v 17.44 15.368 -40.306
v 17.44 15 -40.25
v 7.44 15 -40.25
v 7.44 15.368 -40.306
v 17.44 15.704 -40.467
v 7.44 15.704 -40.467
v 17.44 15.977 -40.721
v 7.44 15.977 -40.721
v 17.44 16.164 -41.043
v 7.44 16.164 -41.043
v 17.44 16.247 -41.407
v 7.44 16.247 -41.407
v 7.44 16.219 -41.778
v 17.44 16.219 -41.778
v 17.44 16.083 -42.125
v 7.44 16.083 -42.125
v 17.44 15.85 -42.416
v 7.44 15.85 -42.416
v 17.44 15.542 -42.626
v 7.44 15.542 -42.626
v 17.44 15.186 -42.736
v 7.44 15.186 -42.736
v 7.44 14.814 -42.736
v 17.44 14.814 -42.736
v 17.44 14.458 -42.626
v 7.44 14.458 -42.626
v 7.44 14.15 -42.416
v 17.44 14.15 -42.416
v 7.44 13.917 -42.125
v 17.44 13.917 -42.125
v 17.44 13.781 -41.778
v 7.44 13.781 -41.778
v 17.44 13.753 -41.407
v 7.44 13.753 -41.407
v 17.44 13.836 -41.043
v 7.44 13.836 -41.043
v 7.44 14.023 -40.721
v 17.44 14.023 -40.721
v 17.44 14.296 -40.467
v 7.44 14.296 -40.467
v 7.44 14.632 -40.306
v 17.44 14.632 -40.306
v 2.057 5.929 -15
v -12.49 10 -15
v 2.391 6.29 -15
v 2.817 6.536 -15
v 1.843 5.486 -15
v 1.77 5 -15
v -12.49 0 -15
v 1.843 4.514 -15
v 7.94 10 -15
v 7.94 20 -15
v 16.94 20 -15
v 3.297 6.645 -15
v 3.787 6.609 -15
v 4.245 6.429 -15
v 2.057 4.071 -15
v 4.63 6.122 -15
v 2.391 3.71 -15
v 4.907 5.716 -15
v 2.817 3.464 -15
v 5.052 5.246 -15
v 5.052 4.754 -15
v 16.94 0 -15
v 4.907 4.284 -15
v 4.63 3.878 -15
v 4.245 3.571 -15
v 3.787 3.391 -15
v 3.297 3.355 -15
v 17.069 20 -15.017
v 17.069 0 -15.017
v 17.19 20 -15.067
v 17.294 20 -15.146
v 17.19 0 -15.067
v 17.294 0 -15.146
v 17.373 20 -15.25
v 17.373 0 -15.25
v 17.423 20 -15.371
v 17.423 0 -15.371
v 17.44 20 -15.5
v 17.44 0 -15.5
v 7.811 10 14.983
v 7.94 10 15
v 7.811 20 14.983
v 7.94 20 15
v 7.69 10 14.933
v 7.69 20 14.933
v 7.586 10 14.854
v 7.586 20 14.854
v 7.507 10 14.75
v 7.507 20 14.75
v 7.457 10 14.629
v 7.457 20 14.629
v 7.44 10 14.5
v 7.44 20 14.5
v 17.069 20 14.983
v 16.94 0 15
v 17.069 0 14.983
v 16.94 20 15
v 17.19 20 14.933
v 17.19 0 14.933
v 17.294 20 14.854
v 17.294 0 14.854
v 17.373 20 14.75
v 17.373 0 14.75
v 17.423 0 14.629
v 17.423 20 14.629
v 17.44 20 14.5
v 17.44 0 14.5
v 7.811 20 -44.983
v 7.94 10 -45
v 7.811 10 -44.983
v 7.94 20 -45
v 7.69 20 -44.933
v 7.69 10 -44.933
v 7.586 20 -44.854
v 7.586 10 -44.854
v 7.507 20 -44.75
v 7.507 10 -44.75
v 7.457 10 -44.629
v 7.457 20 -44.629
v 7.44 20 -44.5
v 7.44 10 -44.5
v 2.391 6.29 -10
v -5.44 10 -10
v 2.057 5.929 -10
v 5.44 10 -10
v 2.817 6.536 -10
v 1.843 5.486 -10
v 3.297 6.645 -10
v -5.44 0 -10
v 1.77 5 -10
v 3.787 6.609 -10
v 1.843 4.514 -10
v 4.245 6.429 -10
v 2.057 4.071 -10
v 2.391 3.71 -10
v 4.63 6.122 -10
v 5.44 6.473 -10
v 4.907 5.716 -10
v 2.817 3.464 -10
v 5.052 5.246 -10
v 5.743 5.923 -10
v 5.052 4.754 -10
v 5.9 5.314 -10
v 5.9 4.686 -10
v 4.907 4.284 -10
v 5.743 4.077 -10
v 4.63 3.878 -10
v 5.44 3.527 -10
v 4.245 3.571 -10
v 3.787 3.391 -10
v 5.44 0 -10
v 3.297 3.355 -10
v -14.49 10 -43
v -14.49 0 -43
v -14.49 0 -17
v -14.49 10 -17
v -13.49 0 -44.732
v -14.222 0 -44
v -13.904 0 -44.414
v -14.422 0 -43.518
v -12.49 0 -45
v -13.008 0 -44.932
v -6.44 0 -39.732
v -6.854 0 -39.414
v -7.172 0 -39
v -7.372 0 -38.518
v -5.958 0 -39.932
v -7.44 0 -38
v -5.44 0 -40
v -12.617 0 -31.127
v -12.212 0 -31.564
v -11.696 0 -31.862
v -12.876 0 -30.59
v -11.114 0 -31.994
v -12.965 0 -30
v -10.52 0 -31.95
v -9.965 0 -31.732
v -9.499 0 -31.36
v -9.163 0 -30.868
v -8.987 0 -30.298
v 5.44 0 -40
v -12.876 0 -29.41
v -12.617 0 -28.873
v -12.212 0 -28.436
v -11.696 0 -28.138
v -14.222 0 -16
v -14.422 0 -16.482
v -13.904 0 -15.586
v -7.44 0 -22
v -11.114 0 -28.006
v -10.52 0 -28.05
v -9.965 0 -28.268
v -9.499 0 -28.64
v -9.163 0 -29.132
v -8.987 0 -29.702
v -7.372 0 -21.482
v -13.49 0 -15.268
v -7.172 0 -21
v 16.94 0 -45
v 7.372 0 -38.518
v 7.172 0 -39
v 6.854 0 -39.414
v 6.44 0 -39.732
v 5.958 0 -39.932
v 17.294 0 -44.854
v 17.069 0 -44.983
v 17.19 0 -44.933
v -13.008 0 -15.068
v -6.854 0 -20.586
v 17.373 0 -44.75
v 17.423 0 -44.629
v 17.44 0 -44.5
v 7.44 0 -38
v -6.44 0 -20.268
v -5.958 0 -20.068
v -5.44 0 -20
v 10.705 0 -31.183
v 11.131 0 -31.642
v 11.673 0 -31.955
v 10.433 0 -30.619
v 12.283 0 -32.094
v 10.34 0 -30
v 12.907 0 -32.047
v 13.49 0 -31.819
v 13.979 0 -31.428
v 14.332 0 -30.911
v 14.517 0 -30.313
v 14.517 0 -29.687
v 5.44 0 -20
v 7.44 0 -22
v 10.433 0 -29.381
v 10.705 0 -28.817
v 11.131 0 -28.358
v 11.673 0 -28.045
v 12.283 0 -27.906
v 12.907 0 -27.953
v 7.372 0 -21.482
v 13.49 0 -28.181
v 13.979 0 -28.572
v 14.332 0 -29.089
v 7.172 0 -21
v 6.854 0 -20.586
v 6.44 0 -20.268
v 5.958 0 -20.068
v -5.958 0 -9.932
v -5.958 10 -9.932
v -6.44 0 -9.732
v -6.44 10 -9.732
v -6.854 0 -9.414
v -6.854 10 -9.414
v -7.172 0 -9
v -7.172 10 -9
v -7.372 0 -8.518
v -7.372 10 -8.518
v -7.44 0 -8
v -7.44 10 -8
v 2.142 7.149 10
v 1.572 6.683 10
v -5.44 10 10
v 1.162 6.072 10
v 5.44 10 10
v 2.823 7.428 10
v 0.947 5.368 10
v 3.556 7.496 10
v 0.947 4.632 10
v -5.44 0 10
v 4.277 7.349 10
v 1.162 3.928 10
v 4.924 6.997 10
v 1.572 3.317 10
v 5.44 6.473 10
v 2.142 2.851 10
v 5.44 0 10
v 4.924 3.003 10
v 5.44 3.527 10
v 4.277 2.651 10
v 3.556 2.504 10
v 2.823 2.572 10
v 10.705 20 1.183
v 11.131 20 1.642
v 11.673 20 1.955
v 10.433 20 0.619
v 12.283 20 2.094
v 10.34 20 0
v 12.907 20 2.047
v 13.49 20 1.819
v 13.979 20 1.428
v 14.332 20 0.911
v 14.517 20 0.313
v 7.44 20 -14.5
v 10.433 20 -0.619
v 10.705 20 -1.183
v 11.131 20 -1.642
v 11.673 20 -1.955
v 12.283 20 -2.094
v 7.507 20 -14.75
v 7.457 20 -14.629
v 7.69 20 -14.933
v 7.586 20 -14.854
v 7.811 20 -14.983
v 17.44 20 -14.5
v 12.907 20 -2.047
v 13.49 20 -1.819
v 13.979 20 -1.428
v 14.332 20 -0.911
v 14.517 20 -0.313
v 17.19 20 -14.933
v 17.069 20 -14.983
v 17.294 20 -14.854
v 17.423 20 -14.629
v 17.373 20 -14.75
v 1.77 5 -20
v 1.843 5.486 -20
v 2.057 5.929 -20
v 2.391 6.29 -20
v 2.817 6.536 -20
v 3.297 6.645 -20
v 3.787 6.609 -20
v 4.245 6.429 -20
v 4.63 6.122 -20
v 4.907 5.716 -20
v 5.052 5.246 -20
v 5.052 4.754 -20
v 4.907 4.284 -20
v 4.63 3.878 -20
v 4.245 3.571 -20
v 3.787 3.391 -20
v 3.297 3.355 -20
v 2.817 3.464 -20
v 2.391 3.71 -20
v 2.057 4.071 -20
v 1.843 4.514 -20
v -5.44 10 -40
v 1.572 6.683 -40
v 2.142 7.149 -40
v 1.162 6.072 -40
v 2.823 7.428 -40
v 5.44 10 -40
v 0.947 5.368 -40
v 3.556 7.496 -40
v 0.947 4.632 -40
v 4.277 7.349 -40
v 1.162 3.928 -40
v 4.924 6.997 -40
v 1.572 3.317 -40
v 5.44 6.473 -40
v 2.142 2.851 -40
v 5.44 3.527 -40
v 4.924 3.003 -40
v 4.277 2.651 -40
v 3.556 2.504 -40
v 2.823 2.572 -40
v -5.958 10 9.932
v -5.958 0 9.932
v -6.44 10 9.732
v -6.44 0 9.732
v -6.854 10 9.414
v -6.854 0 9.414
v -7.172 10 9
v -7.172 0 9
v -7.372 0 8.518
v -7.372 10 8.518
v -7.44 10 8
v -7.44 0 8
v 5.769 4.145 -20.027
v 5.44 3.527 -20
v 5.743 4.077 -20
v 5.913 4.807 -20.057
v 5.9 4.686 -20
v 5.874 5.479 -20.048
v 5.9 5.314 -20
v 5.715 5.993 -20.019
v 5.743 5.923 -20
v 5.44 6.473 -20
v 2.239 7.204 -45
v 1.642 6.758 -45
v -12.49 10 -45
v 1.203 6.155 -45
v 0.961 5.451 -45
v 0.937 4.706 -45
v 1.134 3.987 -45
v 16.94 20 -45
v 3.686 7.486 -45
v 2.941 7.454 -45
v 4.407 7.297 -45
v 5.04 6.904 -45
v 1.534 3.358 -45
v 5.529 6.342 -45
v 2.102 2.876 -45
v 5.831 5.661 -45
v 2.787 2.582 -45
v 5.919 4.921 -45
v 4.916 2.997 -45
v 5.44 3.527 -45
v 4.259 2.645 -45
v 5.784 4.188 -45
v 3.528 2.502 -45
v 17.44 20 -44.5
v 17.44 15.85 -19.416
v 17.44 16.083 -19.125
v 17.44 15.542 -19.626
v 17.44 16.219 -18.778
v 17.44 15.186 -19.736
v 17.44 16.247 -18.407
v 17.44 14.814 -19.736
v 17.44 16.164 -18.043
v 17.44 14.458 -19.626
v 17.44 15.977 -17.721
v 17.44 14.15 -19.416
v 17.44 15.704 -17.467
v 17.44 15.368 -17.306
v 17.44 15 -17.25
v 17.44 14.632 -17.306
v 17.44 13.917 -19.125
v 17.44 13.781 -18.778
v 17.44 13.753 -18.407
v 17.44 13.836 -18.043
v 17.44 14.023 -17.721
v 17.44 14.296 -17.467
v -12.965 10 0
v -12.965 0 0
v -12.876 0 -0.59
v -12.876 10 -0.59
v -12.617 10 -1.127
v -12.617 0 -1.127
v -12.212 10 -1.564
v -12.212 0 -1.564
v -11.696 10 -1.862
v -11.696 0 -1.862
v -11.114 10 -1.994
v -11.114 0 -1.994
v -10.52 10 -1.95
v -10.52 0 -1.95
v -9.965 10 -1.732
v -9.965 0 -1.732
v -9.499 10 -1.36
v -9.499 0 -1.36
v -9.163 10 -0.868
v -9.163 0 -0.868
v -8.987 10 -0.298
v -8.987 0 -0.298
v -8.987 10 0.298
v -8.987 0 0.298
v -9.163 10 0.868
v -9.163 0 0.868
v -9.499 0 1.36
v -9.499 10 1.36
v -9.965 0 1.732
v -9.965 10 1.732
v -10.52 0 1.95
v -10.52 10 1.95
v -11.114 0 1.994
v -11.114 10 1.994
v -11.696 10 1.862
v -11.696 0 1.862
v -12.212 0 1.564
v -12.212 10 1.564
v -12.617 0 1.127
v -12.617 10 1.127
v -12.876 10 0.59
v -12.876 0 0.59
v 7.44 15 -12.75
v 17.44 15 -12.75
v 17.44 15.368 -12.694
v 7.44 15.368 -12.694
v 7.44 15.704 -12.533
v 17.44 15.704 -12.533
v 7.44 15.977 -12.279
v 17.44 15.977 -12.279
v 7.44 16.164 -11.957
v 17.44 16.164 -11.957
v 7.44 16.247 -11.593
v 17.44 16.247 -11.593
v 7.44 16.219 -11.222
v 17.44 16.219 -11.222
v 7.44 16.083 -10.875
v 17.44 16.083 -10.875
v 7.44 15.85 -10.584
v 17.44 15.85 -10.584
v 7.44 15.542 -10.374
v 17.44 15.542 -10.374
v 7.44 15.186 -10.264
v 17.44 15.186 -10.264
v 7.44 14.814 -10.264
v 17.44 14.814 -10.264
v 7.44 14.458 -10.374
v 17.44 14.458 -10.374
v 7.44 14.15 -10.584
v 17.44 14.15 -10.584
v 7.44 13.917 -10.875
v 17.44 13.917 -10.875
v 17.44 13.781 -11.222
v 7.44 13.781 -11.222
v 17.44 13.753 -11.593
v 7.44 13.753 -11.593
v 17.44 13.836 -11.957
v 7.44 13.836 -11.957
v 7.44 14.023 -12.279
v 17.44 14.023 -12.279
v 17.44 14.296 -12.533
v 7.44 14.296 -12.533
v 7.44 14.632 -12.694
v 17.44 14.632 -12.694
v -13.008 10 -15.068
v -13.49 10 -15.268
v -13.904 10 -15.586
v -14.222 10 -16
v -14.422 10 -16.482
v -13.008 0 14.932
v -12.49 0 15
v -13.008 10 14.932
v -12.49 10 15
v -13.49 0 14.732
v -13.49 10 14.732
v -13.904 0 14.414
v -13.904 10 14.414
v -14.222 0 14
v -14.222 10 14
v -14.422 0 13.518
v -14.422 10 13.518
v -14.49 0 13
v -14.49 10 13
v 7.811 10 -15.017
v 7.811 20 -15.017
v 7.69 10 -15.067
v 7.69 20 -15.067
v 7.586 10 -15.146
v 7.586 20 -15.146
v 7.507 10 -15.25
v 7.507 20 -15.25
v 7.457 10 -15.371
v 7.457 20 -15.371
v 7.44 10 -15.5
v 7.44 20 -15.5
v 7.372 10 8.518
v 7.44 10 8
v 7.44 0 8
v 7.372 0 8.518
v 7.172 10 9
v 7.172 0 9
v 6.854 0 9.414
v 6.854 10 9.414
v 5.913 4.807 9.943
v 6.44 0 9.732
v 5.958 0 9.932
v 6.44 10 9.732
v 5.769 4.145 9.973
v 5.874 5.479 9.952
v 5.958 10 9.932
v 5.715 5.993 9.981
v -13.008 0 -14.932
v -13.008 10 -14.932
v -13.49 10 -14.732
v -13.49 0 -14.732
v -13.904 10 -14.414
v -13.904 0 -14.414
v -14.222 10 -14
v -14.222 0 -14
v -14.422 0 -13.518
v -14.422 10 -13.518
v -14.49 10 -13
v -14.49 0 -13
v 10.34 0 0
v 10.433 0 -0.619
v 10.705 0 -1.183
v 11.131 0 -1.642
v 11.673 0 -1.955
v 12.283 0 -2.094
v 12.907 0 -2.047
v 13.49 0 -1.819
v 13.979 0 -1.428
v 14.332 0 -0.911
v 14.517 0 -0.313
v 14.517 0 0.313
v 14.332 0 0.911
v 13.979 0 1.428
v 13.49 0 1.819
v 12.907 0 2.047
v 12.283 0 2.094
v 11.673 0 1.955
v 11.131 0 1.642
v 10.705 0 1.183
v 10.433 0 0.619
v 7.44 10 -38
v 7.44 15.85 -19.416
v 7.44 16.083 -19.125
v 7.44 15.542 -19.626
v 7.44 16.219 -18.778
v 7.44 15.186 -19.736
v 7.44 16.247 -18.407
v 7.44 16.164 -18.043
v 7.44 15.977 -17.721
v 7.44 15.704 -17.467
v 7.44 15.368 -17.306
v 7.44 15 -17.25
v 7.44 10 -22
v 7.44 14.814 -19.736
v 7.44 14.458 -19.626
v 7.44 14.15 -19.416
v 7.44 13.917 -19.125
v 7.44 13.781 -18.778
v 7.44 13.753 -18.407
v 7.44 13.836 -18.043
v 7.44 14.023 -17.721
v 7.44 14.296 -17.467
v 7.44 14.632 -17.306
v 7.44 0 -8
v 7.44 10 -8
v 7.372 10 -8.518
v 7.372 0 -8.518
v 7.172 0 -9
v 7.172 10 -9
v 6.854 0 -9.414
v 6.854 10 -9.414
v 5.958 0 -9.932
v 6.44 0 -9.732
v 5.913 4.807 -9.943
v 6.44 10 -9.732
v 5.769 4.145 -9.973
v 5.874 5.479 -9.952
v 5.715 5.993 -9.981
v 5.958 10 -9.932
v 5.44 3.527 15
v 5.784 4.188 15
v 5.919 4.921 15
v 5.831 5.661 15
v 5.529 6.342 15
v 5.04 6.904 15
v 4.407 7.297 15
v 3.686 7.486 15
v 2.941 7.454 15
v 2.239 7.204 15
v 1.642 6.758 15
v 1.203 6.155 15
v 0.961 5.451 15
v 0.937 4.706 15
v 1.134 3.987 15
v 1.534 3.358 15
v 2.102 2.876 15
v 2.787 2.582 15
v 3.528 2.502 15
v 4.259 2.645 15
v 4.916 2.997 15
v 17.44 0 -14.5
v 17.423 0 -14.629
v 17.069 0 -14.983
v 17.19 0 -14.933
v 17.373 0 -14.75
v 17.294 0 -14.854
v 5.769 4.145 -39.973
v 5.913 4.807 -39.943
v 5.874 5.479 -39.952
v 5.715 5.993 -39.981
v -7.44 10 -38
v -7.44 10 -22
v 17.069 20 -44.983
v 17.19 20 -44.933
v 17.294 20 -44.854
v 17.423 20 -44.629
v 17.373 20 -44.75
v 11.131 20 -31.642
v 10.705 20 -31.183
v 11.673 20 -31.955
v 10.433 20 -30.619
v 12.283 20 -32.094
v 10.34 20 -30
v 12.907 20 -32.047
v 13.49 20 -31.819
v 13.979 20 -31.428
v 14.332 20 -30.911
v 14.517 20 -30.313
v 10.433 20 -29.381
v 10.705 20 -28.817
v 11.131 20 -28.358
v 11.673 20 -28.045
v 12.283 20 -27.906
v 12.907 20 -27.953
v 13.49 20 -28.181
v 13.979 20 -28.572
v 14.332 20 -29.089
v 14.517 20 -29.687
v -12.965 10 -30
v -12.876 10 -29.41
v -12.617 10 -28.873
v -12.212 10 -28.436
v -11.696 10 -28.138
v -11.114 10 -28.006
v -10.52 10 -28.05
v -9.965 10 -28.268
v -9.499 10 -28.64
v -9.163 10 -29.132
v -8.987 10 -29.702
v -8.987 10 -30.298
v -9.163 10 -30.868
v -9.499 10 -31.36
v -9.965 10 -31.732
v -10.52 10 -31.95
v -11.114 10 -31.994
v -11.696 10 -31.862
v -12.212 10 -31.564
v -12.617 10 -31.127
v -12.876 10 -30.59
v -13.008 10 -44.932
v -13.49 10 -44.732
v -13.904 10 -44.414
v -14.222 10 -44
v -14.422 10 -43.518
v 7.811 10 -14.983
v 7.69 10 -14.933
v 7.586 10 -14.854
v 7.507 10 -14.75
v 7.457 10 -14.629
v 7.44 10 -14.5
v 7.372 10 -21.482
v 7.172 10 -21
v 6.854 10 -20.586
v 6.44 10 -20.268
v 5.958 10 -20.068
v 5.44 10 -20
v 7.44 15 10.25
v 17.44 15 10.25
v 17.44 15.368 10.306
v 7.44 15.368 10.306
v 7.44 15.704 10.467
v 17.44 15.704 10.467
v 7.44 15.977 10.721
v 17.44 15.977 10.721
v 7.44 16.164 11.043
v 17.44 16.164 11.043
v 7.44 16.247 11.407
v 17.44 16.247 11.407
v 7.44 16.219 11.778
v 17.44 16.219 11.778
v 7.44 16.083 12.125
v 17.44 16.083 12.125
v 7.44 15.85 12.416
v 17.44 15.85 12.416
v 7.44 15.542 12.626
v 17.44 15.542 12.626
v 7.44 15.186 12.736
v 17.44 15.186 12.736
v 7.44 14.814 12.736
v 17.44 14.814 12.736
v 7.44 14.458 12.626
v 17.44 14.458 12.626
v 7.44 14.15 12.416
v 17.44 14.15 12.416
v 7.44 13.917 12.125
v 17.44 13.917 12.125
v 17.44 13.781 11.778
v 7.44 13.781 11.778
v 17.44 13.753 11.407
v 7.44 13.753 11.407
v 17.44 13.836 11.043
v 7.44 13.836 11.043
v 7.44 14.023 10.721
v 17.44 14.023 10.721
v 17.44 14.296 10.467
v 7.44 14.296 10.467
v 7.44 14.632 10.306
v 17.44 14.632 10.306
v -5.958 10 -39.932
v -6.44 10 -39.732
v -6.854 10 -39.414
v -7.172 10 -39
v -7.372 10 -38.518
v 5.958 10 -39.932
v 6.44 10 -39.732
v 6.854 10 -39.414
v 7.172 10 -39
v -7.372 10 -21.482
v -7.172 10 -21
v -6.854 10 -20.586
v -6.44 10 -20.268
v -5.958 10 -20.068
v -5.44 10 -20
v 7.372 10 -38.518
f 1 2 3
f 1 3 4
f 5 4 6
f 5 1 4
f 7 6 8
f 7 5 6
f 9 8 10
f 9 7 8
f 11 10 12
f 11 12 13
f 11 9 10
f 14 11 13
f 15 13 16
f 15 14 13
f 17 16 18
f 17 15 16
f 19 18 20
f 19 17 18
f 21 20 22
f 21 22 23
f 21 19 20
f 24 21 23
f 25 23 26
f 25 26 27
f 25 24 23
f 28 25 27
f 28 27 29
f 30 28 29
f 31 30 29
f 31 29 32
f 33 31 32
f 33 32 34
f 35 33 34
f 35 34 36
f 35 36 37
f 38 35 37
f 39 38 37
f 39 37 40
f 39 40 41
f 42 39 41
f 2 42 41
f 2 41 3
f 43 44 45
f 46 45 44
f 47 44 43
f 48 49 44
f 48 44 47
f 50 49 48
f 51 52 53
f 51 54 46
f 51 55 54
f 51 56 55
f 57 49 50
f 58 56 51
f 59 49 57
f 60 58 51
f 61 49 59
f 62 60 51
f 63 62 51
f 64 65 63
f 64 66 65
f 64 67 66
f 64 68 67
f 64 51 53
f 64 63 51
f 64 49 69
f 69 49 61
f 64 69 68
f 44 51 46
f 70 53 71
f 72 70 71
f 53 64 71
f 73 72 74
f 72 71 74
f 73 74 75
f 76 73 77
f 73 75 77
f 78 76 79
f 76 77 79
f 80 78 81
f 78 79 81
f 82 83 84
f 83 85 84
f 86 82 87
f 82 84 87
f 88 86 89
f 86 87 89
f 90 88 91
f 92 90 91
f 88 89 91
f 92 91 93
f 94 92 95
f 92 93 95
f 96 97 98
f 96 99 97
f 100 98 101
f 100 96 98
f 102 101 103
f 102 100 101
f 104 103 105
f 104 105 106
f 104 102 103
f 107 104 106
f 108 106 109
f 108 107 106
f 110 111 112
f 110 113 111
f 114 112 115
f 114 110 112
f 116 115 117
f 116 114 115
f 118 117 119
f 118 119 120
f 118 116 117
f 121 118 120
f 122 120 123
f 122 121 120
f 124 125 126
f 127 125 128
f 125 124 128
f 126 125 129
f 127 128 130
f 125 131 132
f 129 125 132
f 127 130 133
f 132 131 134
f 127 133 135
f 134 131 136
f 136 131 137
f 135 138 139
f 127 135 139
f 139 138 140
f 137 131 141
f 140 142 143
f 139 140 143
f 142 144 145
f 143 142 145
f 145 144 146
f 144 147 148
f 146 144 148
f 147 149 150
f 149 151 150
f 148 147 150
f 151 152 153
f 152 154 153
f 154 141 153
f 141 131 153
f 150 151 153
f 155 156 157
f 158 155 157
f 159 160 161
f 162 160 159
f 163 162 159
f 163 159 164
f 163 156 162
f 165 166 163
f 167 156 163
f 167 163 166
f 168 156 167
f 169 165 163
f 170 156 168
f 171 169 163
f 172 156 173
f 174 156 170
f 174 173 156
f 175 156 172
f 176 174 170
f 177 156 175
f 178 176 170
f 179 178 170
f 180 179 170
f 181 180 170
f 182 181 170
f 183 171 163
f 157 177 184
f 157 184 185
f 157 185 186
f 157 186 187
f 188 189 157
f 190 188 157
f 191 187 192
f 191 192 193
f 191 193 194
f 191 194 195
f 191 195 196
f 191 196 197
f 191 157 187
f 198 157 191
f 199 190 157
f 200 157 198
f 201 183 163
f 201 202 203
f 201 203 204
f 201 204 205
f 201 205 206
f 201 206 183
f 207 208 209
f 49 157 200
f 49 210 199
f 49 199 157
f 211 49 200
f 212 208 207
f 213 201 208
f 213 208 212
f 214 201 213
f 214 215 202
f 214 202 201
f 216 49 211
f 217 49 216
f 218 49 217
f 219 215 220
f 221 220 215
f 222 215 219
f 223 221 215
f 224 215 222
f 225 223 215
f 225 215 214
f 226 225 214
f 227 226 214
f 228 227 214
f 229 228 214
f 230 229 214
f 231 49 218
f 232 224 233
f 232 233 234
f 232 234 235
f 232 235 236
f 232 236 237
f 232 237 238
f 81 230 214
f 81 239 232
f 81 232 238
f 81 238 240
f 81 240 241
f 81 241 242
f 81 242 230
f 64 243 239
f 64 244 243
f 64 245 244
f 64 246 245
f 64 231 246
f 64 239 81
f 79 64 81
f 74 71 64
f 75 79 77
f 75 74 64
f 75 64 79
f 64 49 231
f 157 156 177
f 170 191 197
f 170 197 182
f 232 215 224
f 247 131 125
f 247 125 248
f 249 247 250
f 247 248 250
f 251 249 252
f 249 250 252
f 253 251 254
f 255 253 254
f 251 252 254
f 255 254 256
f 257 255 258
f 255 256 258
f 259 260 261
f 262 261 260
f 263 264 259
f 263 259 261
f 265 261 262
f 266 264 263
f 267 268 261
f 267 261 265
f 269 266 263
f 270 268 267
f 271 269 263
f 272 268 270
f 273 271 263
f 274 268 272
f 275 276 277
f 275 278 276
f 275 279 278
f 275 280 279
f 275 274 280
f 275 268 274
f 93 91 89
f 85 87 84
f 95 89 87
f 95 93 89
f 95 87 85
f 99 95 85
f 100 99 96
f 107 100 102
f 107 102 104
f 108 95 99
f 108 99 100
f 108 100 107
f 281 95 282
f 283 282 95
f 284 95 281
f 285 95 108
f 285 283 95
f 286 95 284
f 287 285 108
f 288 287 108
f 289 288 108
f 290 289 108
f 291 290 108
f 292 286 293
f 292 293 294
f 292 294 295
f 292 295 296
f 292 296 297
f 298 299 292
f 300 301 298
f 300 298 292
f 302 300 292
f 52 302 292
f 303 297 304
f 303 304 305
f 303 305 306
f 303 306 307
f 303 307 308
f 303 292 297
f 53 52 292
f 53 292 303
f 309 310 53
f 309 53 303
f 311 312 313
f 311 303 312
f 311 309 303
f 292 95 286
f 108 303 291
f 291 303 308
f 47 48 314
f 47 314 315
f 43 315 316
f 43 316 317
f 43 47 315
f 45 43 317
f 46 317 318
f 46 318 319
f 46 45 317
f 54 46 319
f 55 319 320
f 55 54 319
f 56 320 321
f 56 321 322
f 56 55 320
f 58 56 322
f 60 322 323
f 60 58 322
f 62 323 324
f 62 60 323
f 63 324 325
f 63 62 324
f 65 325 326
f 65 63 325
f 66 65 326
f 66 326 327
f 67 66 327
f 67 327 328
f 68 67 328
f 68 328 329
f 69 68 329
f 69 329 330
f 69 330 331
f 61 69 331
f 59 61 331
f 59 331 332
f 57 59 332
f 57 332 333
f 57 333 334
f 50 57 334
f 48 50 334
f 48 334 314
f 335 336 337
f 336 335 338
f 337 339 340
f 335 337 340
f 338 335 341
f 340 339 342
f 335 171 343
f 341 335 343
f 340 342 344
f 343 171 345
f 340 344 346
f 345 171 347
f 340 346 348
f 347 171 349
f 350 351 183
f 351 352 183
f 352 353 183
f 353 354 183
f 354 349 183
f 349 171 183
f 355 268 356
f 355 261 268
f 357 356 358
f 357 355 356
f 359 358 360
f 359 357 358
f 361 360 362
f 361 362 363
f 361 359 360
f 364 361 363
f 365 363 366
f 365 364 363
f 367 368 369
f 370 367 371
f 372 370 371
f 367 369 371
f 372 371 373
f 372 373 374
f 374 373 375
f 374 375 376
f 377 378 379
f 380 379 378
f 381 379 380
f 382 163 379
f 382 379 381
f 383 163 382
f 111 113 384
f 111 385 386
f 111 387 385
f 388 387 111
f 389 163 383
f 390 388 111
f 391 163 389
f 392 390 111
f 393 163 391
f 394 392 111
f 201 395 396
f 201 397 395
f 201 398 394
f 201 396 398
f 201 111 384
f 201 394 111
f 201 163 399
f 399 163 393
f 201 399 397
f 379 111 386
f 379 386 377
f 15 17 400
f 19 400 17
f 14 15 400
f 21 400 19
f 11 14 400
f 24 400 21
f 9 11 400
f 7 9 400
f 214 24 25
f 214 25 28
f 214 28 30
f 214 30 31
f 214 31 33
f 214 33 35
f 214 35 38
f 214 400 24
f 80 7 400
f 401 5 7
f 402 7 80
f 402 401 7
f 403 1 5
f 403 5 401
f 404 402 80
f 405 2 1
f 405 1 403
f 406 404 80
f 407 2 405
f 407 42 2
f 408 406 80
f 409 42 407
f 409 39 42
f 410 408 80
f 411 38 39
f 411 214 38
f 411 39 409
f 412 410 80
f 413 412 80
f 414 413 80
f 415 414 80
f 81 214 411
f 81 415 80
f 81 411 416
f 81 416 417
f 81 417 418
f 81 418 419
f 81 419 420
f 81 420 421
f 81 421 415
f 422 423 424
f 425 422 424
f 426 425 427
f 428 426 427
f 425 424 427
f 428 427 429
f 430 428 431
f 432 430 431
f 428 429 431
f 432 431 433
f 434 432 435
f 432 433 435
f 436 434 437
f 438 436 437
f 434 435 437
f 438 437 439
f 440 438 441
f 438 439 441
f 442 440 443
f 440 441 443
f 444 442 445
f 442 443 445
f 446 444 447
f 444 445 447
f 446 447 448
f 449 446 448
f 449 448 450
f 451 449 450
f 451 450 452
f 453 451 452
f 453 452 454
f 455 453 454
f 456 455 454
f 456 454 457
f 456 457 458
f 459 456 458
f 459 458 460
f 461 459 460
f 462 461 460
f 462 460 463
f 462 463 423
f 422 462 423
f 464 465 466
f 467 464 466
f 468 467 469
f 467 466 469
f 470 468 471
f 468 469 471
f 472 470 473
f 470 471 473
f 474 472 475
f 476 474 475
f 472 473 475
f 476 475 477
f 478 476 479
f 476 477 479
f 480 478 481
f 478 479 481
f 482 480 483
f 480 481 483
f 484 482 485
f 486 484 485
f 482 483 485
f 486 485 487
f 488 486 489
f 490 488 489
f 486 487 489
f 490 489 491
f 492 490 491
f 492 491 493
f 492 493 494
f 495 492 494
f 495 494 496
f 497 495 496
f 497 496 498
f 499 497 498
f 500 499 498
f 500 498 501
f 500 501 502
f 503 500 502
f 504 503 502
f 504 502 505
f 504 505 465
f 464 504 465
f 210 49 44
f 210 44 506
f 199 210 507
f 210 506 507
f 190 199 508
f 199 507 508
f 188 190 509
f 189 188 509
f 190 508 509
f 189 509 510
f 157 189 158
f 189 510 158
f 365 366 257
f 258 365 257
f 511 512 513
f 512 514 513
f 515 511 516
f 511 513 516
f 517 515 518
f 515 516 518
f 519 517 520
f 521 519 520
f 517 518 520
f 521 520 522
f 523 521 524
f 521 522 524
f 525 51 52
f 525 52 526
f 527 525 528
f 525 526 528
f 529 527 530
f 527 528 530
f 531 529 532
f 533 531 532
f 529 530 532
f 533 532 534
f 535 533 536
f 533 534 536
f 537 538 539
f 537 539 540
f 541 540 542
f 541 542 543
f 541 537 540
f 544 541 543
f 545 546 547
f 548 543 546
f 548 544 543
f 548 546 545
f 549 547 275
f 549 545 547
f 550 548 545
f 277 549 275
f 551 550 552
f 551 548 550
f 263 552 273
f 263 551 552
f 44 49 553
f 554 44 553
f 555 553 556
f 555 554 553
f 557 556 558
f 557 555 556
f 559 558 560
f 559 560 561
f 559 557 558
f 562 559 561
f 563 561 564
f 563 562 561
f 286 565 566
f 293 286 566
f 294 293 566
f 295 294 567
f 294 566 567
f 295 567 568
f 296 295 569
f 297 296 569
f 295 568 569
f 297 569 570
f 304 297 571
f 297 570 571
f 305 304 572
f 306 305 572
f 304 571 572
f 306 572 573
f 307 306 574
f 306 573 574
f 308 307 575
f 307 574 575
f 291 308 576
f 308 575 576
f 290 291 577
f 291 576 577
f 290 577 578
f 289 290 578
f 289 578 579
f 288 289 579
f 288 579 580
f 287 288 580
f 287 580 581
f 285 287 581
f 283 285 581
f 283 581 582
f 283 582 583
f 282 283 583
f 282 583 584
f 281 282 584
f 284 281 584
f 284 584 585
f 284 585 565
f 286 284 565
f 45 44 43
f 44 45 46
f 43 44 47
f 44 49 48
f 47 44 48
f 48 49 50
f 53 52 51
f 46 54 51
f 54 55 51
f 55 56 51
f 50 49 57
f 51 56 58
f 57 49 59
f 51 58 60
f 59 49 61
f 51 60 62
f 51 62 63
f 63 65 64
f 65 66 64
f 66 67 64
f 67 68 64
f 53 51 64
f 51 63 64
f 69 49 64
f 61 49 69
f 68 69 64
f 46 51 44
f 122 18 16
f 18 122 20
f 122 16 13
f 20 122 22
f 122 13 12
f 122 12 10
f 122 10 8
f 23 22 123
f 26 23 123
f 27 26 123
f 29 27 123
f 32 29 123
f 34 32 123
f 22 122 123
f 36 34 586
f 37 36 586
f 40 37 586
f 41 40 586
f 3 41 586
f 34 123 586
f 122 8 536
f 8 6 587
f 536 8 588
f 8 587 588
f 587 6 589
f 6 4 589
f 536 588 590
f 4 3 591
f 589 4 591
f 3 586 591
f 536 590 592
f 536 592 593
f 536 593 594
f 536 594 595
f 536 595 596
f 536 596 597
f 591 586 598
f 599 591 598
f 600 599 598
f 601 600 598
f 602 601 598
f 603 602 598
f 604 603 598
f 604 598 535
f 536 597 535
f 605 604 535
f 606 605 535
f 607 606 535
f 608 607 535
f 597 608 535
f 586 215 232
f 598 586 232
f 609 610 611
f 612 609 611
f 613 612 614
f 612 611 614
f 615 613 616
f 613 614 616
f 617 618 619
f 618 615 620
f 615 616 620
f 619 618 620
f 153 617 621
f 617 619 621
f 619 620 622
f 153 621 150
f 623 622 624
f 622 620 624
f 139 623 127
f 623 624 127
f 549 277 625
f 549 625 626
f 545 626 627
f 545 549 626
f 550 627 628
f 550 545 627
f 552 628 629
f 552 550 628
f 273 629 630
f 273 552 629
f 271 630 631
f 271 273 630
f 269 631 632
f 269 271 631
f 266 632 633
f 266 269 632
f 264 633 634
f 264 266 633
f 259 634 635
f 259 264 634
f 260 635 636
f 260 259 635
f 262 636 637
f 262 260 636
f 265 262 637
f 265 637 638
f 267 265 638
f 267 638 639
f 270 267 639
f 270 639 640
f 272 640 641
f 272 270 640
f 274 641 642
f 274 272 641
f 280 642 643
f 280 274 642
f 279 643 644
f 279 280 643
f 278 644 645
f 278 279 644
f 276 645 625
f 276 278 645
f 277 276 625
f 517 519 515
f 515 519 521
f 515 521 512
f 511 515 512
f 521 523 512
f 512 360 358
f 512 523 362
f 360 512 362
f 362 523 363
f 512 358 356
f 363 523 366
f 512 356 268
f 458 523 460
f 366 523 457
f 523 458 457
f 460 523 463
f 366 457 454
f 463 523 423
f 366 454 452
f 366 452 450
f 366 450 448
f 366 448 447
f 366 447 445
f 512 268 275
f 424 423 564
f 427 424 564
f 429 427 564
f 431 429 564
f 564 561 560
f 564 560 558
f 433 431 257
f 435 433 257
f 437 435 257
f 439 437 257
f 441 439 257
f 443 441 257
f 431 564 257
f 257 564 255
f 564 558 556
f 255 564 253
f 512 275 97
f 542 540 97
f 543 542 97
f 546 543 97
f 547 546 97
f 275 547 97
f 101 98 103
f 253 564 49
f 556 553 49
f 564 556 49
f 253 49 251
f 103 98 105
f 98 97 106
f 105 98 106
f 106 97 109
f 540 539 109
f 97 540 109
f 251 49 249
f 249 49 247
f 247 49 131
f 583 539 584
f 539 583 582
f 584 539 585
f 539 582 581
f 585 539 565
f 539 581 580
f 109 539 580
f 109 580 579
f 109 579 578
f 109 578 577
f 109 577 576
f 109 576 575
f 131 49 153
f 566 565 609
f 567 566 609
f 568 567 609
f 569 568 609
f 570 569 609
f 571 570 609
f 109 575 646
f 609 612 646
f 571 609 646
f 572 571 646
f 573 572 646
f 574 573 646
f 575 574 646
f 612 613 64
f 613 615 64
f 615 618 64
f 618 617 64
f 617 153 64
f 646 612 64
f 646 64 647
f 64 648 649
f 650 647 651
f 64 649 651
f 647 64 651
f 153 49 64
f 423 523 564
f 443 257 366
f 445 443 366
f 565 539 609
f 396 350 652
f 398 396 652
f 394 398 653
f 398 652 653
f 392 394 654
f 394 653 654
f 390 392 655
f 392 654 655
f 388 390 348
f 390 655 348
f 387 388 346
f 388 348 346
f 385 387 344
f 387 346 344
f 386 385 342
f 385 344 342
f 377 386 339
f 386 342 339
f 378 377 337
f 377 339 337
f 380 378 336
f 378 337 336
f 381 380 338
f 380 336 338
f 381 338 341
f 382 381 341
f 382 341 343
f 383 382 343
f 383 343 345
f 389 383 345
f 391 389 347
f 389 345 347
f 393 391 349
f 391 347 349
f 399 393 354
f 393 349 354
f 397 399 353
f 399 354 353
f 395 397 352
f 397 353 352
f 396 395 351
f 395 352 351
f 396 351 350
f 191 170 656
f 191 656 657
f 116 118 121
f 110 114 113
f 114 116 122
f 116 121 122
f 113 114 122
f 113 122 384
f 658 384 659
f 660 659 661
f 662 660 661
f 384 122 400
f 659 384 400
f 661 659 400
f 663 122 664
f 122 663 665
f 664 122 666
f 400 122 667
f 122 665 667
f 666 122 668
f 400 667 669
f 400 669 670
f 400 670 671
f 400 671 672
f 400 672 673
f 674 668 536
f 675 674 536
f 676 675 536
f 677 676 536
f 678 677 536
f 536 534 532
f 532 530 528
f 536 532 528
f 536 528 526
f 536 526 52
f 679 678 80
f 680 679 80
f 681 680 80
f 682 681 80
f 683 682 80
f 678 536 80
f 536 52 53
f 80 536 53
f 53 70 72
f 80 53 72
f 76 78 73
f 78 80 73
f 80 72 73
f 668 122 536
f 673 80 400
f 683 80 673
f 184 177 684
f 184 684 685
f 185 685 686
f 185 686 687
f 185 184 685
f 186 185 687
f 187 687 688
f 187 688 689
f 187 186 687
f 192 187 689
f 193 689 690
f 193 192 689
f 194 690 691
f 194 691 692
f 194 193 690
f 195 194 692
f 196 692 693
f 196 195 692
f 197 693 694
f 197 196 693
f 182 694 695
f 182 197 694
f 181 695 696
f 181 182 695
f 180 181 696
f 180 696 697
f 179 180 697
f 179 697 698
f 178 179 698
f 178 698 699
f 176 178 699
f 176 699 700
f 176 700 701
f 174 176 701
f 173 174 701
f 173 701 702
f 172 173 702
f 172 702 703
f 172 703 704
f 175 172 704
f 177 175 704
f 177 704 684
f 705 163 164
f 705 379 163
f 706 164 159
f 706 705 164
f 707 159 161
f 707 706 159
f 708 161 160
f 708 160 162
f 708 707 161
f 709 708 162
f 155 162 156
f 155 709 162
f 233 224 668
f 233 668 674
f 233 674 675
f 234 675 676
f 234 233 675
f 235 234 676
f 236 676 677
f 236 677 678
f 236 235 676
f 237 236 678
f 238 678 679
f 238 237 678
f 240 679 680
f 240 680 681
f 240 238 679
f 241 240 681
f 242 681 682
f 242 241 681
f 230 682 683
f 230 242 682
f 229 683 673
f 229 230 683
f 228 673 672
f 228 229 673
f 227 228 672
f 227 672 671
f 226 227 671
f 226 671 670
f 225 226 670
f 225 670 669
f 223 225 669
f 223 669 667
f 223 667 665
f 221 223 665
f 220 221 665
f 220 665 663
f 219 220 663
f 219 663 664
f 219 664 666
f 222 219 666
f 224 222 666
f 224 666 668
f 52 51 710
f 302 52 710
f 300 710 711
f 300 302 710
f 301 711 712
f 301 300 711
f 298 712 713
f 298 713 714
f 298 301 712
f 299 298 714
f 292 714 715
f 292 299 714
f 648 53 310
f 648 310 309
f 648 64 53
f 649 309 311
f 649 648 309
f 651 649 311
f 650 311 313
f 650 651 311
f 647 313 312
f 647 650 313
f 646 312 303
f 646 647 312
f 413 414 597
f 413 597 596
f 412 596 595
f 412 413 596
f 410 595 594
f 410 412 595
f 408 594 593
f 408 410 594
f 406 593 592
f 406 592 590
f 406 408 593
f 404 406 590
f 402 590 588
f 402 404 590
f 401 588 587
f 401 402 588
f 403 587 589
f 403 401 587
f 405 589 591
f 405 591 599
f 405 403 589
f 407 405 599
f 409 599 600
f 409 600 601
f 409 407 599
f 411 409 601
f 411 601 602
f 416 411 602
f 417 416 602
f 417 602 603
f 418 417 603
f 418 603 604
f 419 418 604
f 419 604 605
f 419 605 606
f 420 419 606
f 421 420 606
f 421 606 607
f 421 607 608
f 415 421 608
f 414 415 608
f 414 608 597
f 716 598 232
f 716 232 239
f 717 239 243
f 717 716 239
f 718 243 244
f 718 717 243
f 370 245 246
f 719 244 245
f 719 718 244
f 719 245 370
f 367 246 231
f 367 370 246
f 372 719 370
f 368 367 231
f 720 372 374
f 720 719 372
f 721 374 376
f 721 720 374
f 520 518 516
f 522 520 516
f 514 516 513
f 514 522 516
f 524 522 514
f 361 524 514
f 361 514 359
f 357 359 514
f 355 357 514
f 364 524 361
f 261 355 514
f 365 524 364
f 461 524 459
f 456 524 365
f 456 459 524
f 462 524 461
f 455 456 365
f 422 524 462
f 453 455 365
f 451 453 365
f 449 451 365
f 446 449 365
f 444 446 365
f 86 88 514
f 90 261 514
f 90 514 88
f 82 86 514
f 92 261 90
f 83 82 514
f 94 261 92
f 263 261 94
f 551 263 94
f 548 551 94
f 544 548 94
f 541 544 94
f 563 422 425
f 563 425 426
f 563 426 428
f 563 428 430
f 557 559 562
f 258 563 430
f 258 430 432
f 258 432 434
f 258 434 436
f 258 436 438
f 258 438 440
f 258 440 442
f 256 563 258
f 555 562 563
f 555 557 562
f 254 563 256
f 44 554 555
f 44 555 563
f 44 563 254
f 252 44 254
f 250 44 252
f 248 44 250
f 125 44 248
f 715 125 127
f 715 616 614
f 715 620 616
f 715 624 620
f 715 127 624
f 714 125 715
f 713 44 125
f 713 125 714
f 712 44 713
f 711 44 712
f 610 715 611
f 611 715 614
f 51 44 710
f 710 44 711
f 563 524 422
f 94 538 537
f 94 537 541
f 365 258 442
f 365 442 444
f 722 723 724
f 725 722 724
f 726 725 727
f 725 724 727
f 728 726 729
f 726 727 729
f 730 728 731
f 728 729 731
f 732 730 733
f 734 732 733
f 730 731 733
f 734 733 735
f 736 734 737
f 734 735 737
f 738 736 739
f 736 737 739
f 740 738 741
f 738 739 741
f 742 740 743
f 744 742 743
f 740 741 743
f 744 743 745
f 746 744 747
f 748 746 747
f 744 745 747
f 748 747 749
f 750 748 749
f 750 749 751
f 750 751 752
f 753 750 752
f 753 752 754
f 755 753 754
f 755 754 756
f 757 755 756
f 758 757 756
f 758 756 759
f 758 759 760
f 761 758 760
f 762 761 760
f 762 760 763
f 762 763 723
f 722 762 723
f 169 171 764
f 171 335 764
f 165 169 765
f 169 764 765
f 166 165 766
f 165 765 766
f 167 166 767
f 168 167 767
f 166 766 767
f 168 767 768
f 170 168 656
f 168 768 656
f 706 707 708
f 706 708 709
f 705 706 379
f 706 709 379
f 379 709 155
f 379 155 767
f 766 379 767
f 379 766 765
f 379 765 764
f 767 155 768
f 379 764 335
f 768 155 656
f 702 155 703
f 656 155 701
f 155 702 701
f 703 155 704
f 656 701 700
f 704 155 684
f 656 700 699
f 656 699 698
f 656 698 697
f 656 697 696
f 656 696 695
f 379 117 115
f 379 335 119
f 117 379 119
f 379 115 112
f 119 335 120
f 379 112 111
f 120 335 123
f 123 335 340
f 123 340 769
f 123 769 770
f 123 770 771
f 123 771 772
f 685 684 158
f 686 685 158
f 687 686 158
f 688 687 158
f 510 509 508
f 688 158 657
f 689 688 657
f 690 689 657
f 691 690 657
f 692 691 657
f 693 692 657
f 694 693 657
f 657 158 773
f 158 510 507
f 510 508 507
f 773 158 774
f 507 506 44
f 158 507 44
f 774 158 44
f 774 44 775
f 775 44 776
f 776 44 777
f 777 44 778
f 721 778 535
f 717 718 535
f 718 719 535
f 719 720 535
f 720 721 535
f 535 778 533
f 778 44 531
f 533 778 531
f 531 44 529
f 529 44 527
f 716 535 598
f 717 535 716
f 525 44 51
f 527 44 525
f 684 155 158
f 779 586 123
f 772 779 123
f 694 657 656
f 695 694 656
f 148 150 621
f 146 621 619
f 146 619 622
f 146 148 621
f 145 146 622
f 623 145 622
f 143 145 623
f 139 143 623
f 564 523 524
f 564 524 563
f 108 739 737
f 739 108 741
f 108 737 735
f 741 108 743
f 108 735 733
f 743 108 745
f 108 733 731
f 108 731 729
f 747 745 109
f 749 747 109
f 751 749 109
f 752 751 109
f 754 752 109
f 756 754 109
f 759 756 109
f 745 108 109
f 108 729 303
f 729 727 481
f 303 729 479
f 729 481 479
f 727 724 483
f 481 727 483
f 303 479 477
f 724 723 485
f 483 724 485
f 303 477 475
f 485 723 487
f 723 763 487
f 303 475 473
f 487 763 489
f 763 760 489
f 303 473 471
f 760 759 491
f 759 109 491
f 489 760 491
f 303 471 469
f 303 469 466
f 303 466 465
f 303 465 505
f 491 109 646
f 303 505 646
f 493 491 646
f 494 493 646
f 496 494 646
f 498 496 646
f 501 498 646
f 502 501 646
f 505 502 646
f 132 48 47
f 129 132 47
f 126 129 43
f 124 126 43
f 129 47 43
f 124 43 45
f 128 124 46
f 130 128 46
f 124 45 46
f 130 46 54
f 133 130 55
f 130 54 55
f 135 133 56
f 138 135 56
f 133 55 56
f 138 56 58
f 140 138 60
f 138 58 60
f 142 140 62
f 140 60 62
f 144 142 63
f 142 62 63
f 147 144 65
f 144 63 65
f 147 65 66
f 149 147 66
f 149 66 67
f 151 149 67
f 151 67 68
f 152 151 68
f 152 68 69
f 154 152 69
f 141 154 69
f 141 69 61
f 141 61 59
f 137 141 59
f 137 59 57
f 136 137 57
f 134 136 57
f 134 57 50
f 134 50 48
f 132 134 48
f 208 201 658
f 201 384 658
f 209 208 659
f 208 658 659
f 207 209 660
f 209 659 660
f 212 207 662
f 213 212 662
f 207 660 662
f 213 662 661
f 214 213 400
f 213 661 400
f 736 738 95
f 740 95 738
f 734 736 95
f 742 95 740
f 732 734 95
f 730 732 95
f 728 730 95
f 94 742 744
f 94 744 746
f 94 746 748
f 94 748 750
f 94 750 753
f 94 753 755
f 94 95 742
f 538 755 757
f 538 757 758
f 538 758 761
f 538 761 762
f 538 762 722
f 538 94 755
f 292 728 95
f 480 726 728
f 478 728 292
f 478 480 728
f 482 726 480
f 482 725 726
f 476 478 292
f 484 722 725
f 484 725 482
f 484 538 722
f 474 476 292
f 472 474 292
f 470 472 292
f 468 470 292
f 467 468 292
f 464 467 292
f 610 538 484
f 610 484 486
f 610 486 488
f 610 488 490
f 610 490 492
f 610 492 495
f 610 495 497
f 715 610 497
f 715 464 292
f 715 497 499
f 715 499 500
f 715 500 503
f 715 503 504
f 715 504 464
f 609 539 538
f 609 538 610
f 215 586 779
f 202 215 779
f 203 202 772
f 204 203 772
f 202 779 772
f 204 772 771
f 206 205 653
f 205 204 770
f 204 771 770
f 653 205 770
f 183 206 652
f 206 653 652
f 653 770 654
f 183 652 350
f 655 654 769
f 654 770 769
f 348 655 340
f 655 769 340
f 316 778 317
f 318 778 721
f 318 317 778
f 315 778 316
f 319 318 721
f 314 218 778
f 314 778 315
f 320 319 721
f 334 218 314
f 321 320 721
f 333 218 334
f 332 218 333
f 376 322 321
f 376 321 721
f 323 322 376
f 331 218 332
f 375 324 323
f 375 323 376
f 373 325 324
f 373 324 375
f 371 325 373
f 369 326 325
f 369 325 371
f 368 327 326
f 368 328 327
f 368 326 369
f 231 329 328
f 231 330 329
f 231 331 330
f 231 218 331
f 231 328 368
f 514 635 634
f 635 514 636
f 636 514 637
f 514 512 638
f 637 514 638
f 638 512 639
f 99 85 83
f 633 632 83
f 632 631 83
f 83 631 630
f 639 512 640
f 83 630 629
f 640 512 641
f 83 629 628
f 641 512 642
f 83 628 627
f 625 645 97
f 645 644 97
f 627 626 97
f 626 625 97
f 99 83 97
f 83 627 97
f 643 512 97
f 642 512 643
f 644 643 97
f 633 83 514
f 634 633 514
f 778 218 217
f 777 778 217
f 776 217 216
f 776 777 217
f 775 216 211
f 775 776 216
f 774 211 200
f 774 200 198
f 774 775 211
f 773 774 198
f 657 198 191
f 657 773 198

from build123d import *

# Parameters (mm, degrees)
SKETCH1_W                   = 31.93
SKETCH1_H                   = 30
SKETCH1_W_2                 = 14.88
SKETCH1_H_2                 = 20
BOSS_EXTRUDE1_DEPTH         = 10
SKETCH2_W                   = 10
SKETCH2_H                   = 30
BOSS_EXTRUDE2_DEPTH         = 10
TAP_DRILL_FOR_M5X0_8_TAP1_D = 4.2
FILLET2_R                   = 2
SKETCH5_R                   = 2.5
CUT_EXTRUDE2_DEPTH          = 37.457558887
TAP_DRILL_FOR_M4X0_7_TAP1_D = 3.3
FILLET3_R                   = 2
FILLET4_R                   = 0.5
TAP_DRILL_FOR_M3X0_5_TAP1_D = 2.5
F_4_0_4_DIAMETER_HOLE1_D    = 4


with BuildPart() as part:
    # Sketch1 → Boss-Extrude1 (new body)
    with BuildSketch(Plane(origin=(0, 0, 0), x_dir=(1, 0, 0), z_dir=(0, 1, 0))):
        with Locations((1.475, 0)):
            Rectangle(SKETCH1_W, SKETCH1_H)
        Rectangle(SKETCH1_W_2, SKETCH1_H_2, mode=Mode.SUBTRACT)
    extrude(amount=BOSS_EXTRUDE1_DEPTH)

    # Sketch2 → Boss-Extrude2 (add)
    with BuildSketch(Plane(origin=(0, 10, 0), x_dir=(1, 0, 0), z_dir=(0, 1, 0))):
        with Locations((12.44, 0)):
            Rectangle(SKETCH2_W, SKETCH2_H)
    extrude(amount=BOSS_EXTRUDE2_DEPTH)

    # Tap Drill for M5x0.8 Tap1 (through all)
    with Locations(Plane(origin=(0, 20, 0), x_dir=(1, 0, 0), z_dir=(0, 1, 0))):
        with Locations((12.44, 0)):
            Hole(TAP_DRILL_FOR_M5X0_8_TAP1_D / 2)

    # Fillet2
    fillet2_edges = [part.edges().sort_by_distance(p)[0] for p in [
        (-7.44, 5, -10),
        (-7.44, 5, 10),
        (7.44, 5, 10),
        (7.44, 5, -10),
    ]]
    fillet(fillet2_edges, radius=FILLET2_R)

    # Sketch5 → Cut-Extrude2 (cut, through all)
    with BuildSketch(Plane.XY.offset(-10)):
        with Locations(Location((3.42, 5, 0), (0, 0, 323.900983741))):
            Circle(SKETCH5_R)
    extrude(amount=CUT_EXTRUDE2_DEPTH, mode=Mode.SUBTRACT)

    # Tap Drill for M4x0.7 Tap1 (through all)
    with Locations(Plane.XY.offset(-10)):
        with Locations((3.42, 5)):
            Hole(TAP_DRILL_FOR_M4X0_7_TAP1_D / 2)

    # Fillet3
    fillet3_edges = [part.edges().sort_by_distance(p)[0] for p in [
        (-14.49, 5, -15),
        (-14.49, 5, 15),
    ]]
    fillet(fillet3_edges, radius=FILLET3_R)

    # Fillet4
    fillet4_edges = [part.edges().sort_by_distance(p)[0] for p in [
        (7.44, 15, -15),
        (7.44, 15, 15),
        (17.44, 10, -15),
        (17.44, 10, 15),
    ]]
    fillet(fillet4_edges, radius=FILLET4_R)

    # Tap Drill for M3x0.5 Tap1 (through all)
    with Locations(Plane.ZY.offset(-7.44)):
        with Locations((-11.5, 15), (11.5, 15)):
            Hole(TAP_DRILL_FOR_M3X0_5_TAP1_D / 2)

    # Ø4.0 (4) Diameter Hole1 (through all)
    with Locations(Plane(origin=(0, 10, 0), x_dir=(1, 0, 0), z_dir=(0, 1, 0))):
        with Locations((-10.965, 0)):
            Hole(F_4_0_4_DIAMETER_HOLE1_D / 2)


with BuildPart() as body_2:
    # Mirror1: mirrored copy
    add(part.part.mirror(Plane(origin=(17.44, 10, -15), x_dir=(1, 0, 0), z_dir=(0, 0, 1))))


solid = Compound([part.part, body_2.part])
